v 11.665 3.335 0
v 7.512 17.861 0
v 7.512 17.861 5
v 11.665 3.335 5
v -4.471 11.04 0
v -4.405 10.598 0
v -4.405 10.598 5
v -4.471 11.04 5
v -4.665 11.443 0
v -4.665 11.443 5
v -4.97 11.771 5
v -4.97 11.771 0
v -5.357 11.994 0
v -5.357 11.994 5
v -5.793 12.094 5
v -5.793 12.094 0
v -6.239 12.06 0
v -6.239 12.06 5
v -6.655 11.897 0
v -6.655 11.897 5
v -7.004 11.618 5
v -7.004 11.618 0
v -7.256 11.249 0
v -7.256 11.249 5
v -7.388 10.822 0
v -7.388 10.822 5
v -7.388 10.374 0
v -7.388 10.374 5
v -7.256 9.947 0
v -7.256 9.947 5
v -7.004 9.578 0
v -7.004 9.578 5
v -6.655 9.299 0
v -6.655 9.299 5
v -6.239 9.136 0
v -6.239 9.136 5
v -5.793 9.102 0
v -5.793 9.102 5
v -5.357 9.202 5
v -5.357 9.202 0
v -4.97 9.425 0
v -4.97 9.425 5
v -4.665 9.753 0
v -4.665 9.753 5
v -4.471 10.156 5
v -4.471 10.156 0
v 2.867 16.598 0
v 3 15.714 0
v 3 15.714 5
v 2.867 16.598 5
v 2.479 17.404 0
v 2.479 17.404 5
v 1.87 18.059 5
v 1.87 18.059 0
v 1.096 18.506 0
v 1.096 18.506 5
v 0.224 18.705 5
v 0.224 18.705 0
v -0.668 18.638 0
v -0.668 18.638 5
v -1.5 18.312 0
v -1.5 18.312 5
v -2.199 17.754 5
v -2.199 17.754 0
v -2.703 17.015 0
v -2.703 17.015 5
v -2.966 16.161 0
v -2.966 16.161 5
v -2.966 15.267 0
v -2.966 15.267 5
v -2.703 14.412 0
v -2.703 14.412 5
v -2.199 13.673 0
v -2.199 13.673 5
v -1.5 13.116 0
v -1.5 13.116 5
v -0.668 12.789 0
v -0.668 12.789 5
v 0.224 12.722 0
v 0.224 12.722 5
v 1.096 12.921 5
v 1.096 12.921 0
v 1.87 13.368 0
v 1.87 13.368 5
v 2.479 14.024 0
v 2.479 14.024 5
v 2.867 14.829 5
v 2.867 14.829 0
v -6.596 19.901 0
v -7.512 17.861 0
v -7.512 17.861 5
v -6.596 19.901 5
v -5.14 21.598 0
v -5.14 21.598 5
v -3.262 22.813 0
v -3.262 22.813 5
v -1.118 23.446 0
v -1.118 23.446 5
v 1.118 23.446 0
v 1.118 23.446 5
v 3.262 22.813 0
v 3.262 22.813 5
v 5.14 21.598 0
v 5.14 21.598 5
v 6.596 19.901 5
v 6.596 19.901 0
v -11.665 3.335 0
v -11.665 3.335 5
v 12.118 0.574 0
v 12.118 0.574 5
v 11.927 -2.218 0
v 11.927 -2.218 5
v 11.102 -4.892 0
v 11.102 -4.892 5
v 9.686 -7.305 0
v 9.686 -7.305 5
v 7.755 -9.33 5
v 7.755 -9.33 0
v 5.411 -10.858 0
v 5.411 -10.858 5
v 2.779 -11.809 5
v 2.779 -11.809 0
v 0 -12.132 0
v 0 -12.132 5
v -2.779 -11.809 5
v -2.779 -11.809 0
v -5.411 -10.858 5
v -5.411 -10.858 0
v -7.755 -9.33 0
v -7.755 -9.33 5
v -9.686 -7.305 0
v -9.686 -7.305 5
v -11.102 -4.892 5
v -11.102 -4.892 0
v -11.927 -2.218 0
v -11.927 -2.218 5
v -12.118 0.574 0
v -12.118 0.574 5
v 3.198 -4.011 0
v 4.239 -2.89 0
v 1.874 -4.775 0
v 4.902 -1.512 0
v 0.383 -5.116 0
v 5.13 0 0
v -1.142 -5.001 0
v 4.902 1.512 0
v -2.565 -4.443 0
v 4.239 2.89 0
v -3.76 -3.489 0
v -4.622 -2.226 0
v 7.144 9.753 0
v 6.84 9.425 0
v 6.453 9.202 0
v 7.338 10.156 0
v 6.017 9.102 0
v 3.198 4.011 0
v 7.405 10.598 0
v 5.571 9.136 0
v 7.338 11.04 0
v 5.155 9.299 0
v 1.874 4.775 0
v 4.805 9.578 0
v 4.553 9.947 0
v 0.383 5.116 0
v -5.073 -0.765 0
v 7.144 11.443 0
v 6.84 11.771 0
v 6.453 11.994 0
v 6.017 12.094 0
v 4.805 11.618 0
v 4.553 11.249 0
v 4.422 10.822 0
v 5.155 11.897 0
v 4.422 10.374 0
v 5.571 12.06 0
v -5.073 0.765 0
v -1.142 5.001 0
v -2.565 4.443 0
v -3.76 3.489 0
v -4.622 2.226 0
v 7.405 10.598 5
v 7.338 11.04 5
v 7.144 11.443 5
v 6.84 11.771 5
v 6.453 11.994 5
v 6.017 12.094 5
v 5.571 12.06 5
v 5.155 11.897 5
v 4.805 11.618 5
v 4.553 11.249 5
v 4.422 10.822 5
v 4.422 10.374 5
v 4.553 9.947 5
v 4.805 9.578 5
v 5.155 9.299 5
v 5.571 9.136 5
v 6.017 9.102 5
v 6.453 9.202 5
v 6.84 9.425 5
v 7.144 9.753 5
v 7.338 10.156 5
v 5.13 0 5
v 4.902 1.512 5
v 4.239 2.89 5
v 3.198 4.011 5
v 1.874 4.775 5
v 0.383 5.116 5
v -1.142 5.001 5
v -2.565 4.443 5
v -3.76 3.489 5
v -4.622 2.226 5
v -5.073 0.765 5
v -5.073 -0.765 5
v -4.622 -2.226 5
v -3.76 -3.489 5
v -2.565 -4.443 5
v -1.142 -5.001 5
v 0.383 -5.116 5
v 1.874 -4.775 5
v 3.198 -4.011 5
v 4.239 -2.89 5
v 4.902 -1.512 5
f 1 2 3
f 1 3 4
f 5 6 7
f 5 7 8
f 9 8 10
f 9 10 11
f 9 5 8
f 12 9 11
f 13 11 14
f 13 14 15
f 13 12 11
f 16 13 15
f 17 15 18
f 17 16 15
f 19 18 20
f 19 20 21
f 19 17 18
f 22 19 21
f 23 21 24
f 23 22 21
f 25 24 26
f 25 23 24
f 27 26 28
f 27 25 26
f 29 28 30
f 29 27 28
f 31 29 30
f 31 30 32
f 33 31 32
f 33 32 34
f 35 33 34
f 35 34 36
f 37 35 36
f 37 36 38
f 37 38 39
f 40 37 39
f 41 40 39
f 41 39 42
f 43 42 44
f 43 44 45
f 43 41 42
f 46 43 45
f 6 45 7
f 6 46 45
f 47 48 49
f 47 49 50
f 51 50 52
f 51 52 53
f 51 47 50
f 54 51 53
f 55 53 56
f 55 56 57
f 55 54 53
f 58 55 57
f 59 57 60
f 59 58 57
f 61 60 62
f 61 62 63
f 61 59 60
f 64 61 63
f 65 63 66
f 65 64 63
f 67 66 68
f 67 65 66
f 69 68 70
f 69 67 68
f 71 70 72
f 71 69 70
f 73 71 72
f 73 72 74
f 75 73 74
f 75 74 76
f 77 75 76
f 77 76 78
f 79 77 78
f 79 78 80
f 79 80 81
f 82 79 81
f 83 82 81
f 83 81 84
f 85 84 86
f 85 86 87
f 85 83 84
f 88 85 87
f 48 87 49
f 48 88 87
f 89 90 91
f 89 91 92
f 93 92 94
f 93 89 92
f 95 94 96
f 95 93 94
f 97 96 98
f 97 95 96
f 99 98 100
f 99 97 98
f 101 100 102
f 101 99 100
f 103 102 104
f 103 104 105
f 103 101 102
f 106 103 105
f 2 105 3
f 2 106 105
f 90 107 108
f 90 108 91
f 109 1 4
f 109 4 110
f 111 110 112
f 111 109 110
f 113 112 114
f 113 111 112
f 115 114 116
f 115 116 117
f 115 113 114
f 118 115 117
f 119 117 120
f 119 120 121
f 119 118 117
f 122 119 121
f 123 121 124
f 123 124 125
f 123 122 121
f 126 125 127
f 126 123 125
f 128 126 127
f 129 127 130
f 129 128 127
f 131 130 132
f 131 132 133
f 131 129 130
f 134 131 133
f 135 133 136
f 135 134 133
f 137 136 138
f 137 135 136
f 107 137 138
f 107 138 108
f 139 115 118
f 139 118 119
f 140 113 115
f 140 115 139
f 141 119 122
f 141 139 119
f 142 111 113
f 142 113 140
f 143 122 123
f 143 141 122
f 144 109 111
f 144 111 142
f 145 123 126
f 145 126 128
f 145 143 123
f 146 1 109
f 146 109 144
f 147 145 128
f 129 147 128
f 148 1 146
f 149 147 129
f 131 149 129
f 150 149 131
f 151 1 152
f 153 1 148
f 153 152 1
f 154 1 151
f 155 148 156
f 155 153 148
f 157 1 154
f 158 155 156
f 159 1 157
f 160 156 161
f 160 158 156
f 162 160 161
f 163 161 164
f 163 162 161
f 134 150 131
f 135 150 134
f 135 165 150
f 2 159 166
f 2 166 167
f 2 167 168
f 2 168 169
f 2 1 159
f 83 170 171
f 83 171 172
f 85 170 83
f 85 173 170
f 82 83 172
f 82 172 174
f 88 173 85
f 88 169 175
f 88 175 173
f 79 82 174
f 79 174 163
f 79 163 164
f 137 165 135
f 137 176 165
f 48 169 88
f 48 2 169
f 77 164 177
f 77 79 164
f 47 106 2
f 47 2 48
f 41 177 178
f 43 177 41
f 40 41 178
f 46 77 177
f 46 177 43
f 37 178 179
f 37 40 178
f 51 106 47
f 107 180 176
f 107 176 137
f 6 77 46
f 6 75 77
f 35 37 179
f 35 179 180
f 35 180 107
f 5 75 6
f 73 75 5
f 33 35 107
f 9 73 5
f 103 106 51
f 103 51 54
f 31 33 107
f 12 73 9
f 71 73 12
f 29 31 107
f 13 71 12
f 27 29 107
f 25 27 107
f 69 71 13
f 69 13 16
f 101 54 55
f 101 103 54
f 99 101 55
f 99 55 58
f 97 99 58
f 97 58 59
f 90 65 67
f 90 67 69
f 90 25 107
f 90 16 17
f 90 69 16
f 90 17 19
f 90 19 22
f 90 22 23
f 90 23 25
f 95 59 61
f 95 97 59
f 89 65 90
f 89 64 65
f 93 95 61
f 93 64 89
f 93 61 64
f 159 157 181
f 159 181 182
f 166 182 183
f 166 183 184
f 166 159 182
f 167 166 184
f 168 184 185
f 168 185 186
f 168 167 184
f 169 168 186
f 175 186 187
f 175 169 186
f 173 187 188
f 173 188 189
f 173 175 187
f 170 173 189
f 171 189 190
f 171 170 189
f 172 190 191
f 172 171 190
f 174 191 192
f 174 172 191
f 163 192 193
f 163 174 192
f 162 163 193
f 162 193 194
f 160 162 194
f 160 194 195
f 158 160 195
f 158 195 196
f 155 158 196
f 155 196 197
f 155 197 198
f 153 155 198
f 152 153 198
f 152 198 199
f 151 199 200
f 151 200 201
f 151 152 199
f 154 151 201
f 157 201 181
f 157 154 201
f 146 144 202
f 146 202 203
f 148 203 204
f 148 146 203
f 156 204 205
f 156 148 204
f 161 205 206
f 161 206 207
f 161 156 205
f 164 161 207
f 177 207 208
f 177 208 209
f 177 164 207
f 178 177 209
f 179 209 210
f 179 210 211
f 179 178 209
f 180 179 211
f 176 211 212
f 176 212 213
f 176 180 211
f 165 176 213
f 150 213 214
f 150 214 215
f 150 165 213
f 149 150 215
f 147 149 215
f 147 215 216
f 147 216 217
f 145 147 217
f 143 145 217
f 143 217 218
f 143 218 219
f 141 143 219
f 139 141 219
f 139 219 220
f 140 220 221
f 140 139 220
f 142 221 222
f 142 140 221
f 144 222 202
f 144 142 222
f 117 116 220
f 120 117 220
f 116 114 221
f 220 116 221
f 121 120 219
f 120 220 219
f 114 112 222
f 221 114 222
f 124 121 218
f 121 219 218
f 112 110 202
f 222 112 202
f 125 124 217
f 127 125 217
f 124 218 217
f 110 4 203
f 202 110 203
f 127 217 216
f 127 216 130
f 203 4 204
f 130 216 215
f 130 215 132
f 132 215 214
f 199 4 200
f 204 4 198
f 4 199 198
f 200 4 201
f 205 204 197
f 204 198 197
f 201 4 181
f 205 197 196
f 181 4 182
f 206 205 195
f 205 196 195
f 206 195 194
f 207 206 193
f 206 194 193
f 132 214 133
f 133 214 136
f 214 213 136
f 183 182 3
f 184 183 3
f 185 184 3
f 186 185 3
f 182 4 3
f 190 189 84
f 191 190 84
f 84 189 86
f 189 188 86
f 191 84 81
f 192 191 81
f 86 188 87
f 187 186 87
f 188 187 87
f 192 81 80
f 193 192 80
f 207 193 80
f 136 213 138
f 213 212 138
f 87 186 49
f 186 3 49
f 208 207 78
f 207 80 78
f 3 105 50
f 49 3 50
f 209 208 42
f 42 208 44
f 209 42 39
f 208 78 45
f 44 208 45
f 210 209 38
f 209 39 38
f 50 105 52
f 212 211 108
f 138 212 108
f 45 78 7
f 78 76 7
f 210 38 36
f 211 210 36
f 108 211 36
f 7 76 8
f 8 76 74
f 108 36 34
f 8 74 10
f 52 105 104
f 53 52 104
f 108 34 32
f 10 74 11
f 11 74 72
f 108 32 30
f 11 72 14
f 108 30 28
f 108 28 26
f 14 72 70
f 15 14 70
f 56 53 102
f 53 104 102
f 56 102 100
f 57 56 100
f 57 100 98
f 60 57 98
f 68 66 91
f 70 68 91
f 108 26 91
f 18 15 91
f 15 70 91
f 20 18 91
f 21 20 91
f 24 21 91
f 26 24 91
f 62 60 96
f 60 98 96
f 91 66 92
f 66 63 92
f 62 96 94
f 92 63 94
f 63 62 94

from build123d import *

# Parameters (mm, degrees)
ESQUISSE1_R        = 5.129898749
ESQUISSE1_R_2      = 3
ESQUISSE1_R_3      = 1.5
BOSS_EXTRU_1_DEPTH = 5


with BuildPart() as part:
    # Esquisse1 → Boss.-Extru.1 (new body)
    with BuildSketch(Plane.XY):
        with BuildLine():
            Line((7.511654648, 17.86120118), (11.664614312, 3.334802688))
            ThreePointArc((11.664614312, 3.334802688), (0, -12.131946918), (-11.664614312, 3.334802688))
            Line((-11.664614312, 3.334802688), (-7.511654648, 17.86120118))
            ThreePointArc((-7.511654648, 17.86120118), (0, 23.526292848), (7.511654648, 17.86120118))
        make_face()
        Circle(ESQUISSE1_R, mode=Mode.SUBTRACT)
        with Locations((0, 15.713690304)):
            Circle(ESQUISSE1_R_2, mode=Mode.SUBTRACT)
        with Locations((5.904785434, 10.598001934)):
            Circle(ESQUISSE1_R_3, mode=Mode.SUBTRACT)
        with Locations((-5.904785434, 10.598001934)):
            Circle(ESQUISSE1_R_3, mode=Mode.SUBTRACT)
    extrude(amount=BOSS_EXTRU_1_DEPTH)


solid = part.part
